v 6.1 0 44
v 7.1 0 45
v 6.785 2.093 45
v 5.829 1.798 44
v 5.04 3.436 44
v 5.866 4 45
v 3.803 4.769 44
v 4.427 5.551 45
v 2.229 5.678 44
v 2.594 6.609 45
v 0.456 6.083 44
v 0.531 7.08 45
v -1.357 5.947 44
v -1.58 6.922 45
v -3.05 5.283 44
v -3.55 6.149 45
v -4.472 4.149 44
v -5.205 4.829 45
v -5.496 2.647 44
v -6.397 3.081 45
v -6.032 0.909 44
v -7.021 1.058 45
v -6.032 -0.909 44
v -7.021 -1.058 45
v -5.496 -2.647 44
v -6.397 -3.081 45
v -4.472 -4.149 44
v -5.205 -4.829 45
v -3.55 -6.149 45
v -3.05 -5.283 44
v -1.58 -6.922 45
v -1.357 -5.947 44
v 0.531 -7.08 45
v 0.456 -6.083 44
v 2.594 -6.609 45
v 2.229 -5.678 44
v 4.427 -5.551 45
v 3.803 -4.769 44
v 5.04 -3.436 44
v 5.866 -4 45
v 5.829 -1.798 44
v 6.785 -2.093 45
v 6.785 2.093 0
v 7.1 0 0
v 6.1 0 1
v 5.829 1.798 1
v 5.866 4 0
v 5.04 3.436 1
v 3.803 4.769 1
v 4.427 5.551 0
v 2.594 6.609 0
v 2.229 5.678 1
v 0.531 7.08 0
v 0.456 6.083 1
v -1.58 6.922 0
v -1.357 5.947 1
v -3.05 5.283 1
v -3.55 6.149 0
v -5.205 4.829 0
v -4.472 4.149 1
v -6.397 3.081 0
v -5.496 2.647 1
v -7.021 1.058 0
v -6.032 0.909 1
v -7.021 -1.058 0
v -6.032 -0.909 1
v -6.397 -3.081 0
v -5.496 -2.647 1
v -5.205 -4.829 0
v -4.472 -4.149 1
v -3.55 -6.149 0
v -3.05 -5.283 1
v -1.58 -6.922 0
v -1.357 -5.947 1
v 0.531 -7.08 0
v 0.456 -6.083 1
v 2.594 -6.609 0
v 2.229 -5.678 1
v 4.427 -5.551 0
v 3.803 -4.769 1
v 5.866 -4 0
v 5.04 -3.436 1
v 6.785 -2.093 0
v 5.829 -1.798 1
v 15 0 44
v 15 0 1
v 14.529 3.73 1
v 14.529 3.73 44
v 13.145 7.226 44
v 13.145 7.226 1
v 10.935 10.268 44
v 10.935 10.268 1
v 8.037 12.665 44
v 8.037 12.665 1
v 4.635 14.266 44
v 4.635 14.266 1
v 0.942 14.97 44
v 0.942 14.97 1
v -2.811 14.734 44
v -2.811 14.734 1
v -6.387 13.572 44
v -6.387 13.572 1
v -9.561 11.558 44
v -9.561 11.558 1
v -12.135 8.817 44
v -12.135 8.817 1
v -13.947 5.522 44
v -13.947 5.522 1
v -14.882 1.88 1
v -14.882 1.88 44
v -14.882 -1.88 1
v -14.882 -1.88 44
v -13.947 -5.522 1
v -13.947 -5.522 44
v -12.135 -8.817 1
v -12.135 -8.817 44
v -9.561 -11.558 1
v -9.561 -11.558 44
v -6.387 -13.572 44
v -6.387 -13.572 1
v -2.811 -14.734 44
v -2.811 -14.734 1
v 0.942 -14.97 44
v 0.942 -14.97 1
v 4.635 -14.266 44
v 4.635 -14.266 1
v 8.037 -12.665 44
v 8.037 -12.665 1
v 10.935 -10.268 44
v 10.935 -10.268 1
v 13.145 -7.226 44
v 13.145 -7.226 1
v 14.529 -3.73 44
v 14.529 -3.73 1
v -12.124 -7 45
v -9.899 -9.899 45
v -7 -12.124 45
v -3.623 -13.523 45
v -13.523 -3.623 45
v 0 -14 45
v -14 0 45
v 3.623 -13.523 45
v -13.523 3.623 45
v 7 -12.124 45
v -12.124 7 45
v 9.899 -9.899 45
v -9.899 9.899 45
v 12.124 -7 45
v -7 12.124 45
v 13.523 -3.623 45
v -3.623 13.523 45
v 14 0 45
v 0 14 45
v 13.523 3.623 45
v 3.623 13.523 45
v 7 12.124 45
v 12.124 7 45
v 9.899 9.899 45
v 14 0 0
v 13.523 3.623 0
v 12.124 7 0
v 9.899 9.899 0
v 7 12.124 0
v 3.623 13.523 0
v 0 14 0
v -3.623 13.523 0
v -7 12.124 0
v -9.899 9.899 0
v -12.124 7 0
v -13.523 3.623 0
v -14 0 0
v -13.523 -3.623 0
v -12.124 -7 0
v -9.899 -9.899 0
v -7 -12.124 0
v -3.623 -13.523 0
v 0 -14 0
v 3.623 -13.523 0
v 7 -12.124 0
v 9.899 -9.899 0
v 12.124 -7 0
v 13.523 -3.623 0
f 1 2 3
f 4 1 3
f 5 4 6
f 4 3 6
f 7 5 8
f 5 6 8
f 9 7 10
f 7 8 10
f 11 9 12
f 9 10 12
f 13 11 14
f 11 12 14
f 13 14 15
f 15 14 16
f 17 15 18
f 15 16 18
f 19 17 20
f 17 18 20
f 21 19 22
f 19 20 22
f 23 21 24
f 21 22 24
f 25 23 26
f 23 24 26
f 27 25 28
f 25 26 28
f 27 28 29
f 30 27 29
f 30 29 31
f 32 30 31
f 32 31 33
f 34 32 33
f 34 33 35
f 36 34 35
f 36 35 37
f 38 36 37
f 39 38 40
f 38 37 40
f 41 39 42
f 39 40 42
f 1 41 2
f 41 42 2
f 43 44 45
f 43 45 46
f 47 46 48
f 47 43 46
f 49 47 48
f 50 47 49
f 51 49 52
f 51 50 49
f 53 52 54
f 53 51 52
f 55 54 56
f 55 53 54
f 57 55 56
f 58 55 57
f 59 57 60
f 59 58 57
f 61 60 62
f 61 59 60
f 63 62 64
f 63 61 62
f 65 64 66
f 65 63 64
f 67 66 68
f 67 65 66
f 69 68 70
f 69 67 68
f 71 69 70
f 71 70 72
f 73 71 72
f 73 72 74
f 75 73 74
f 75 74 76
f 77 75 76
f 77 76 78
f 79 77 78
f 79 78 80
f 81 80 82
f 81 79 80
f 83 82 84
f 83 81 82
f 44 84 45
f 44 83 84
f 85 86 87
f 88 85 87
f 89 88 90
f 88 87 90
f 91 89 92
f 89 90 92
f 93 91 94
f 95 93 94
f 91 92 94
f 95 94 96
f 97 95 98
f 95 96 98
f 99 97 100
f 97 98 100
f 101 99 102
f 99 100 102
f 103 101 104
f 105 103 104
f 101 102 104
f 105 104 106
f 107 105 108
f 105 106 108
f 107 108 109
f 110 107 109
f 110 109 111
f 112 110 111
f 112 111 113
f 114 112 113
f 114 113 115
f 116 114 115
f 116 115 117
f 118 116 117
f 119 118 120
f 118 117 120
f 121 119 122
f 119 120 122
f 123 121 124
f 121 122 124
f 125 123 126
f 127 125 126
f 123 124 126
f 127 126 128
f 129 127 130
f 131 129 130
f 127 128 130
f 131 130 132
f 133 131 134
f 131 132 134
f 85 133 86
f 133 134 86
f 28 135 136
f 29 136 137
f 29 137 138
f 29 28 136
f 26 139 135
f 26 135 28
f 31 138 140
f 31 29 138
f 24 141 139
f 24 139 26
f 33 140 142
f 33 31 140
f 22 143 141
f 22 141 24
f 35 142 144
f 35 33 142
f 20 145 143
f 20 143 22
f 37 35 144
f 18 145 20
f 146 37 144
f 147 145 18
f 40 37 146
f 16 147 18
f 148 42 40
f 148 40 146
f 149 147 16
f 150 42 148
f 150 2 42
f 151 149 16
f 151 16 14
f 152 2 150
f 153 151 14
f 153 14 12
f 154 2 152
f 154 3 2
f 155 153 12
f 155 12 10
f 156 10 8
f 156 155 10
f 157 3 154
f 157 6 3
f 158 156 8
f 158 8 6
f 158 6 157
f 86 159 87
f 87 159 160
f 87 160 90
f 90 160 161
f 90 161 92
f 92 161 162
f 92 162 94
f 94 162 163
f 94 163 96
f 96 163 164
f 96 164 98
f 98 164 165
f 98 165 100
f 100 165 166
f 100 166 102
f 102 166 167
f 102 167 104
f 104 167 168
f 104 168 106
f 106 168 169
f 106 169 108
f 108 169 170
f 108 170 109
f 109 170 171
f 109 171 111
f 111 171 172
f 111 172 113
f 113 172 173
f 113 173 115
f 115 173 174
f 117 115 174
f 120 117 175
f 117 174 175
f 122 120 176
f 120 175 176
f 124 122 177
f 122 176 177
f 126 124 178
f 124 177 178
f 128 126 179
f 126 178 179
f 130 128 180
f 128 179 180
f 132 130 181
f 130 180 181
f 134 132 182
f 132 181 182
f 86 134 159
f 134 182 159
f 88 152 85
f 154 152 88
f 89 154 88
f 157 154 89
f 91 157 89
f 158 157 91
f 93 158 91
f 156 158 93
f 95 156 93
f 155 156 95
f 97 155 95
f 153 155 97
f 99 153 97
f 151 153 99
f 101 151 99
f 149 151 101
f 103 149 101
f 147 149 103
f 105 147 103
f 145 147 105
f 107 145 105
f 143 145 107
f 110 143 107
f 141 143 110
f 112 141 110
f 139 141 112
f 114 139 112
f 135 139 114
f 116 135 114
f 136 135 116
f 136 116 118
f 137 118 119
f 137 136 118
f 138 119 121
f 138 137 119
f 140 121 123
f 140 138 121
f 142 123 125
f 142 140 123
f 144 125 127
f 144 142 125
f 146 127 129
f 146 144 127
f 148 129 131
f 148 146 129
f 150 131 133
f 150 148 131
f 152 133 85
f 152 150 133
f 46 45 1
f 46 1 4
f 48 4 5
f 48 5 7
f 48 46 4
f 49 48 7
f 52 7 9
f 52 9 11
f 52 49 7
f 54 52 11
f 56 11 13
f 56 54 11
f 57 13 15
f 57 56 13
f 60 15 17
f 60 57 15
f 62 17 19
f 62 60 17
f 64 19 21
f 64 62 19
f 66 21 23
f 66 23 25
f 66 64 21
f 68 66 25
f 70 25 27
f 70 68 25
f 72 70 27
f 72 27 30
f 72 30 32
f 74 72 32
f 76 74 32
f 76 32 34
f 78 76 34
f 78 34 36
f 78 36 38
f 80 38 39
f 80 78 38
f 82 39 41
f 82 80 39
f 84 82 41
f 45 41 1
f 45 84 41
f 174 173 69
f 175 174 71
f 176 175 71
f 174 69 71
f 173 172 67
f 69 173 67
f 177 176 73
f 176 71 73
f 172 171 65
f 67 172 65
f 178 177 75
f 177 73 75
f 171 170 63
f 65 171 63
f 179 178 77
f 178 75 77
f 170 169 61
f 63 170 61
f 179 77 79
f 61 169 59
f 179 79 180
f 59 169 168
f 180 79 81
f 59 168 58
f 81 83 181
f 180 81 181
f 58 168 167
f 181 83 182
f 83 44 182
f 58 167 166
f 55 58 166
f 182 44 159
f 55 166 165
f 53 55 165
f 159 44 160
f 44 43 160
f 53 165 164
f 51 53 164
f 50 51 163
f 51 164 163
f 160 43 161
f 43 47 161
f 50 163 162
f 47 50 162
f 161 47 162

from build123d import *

# Parameters (mm, degrees)
SZKIC1_R                    = 15
SZKIC1_R_2                  = 6.1
DODANIE_WYCI_GNI_CIE1_DEPTH = 45
SFAZOWANIE1_SIZE            = 1


with BuildPart() as part:
    # Szkic1 → Dodanie-wyciągnięcie1 (new body)
    with BuildSketch(Plane.XY):
        Circle(SZKIC1_R)
        Circle(SZKIC1_R_2, mode=Mode.SUBTRACT)
    extrude(amount=DODANIE_WYCI_GNI_CIE1_DEPTH)

    # Sfazowanie1
    sfazowanie1_edges = [part.edges().sort_by_distance(p)[0] for p in [
        (-15, 0, 0),
        (-15, 0, 45),
        (-6.1, 0, 0),
        (-6.1, 0, 45),
    ]]
    chamfer(sfazowanie1_edges, length=SFAZOWANIE1_SIZE)


solid = part.part
